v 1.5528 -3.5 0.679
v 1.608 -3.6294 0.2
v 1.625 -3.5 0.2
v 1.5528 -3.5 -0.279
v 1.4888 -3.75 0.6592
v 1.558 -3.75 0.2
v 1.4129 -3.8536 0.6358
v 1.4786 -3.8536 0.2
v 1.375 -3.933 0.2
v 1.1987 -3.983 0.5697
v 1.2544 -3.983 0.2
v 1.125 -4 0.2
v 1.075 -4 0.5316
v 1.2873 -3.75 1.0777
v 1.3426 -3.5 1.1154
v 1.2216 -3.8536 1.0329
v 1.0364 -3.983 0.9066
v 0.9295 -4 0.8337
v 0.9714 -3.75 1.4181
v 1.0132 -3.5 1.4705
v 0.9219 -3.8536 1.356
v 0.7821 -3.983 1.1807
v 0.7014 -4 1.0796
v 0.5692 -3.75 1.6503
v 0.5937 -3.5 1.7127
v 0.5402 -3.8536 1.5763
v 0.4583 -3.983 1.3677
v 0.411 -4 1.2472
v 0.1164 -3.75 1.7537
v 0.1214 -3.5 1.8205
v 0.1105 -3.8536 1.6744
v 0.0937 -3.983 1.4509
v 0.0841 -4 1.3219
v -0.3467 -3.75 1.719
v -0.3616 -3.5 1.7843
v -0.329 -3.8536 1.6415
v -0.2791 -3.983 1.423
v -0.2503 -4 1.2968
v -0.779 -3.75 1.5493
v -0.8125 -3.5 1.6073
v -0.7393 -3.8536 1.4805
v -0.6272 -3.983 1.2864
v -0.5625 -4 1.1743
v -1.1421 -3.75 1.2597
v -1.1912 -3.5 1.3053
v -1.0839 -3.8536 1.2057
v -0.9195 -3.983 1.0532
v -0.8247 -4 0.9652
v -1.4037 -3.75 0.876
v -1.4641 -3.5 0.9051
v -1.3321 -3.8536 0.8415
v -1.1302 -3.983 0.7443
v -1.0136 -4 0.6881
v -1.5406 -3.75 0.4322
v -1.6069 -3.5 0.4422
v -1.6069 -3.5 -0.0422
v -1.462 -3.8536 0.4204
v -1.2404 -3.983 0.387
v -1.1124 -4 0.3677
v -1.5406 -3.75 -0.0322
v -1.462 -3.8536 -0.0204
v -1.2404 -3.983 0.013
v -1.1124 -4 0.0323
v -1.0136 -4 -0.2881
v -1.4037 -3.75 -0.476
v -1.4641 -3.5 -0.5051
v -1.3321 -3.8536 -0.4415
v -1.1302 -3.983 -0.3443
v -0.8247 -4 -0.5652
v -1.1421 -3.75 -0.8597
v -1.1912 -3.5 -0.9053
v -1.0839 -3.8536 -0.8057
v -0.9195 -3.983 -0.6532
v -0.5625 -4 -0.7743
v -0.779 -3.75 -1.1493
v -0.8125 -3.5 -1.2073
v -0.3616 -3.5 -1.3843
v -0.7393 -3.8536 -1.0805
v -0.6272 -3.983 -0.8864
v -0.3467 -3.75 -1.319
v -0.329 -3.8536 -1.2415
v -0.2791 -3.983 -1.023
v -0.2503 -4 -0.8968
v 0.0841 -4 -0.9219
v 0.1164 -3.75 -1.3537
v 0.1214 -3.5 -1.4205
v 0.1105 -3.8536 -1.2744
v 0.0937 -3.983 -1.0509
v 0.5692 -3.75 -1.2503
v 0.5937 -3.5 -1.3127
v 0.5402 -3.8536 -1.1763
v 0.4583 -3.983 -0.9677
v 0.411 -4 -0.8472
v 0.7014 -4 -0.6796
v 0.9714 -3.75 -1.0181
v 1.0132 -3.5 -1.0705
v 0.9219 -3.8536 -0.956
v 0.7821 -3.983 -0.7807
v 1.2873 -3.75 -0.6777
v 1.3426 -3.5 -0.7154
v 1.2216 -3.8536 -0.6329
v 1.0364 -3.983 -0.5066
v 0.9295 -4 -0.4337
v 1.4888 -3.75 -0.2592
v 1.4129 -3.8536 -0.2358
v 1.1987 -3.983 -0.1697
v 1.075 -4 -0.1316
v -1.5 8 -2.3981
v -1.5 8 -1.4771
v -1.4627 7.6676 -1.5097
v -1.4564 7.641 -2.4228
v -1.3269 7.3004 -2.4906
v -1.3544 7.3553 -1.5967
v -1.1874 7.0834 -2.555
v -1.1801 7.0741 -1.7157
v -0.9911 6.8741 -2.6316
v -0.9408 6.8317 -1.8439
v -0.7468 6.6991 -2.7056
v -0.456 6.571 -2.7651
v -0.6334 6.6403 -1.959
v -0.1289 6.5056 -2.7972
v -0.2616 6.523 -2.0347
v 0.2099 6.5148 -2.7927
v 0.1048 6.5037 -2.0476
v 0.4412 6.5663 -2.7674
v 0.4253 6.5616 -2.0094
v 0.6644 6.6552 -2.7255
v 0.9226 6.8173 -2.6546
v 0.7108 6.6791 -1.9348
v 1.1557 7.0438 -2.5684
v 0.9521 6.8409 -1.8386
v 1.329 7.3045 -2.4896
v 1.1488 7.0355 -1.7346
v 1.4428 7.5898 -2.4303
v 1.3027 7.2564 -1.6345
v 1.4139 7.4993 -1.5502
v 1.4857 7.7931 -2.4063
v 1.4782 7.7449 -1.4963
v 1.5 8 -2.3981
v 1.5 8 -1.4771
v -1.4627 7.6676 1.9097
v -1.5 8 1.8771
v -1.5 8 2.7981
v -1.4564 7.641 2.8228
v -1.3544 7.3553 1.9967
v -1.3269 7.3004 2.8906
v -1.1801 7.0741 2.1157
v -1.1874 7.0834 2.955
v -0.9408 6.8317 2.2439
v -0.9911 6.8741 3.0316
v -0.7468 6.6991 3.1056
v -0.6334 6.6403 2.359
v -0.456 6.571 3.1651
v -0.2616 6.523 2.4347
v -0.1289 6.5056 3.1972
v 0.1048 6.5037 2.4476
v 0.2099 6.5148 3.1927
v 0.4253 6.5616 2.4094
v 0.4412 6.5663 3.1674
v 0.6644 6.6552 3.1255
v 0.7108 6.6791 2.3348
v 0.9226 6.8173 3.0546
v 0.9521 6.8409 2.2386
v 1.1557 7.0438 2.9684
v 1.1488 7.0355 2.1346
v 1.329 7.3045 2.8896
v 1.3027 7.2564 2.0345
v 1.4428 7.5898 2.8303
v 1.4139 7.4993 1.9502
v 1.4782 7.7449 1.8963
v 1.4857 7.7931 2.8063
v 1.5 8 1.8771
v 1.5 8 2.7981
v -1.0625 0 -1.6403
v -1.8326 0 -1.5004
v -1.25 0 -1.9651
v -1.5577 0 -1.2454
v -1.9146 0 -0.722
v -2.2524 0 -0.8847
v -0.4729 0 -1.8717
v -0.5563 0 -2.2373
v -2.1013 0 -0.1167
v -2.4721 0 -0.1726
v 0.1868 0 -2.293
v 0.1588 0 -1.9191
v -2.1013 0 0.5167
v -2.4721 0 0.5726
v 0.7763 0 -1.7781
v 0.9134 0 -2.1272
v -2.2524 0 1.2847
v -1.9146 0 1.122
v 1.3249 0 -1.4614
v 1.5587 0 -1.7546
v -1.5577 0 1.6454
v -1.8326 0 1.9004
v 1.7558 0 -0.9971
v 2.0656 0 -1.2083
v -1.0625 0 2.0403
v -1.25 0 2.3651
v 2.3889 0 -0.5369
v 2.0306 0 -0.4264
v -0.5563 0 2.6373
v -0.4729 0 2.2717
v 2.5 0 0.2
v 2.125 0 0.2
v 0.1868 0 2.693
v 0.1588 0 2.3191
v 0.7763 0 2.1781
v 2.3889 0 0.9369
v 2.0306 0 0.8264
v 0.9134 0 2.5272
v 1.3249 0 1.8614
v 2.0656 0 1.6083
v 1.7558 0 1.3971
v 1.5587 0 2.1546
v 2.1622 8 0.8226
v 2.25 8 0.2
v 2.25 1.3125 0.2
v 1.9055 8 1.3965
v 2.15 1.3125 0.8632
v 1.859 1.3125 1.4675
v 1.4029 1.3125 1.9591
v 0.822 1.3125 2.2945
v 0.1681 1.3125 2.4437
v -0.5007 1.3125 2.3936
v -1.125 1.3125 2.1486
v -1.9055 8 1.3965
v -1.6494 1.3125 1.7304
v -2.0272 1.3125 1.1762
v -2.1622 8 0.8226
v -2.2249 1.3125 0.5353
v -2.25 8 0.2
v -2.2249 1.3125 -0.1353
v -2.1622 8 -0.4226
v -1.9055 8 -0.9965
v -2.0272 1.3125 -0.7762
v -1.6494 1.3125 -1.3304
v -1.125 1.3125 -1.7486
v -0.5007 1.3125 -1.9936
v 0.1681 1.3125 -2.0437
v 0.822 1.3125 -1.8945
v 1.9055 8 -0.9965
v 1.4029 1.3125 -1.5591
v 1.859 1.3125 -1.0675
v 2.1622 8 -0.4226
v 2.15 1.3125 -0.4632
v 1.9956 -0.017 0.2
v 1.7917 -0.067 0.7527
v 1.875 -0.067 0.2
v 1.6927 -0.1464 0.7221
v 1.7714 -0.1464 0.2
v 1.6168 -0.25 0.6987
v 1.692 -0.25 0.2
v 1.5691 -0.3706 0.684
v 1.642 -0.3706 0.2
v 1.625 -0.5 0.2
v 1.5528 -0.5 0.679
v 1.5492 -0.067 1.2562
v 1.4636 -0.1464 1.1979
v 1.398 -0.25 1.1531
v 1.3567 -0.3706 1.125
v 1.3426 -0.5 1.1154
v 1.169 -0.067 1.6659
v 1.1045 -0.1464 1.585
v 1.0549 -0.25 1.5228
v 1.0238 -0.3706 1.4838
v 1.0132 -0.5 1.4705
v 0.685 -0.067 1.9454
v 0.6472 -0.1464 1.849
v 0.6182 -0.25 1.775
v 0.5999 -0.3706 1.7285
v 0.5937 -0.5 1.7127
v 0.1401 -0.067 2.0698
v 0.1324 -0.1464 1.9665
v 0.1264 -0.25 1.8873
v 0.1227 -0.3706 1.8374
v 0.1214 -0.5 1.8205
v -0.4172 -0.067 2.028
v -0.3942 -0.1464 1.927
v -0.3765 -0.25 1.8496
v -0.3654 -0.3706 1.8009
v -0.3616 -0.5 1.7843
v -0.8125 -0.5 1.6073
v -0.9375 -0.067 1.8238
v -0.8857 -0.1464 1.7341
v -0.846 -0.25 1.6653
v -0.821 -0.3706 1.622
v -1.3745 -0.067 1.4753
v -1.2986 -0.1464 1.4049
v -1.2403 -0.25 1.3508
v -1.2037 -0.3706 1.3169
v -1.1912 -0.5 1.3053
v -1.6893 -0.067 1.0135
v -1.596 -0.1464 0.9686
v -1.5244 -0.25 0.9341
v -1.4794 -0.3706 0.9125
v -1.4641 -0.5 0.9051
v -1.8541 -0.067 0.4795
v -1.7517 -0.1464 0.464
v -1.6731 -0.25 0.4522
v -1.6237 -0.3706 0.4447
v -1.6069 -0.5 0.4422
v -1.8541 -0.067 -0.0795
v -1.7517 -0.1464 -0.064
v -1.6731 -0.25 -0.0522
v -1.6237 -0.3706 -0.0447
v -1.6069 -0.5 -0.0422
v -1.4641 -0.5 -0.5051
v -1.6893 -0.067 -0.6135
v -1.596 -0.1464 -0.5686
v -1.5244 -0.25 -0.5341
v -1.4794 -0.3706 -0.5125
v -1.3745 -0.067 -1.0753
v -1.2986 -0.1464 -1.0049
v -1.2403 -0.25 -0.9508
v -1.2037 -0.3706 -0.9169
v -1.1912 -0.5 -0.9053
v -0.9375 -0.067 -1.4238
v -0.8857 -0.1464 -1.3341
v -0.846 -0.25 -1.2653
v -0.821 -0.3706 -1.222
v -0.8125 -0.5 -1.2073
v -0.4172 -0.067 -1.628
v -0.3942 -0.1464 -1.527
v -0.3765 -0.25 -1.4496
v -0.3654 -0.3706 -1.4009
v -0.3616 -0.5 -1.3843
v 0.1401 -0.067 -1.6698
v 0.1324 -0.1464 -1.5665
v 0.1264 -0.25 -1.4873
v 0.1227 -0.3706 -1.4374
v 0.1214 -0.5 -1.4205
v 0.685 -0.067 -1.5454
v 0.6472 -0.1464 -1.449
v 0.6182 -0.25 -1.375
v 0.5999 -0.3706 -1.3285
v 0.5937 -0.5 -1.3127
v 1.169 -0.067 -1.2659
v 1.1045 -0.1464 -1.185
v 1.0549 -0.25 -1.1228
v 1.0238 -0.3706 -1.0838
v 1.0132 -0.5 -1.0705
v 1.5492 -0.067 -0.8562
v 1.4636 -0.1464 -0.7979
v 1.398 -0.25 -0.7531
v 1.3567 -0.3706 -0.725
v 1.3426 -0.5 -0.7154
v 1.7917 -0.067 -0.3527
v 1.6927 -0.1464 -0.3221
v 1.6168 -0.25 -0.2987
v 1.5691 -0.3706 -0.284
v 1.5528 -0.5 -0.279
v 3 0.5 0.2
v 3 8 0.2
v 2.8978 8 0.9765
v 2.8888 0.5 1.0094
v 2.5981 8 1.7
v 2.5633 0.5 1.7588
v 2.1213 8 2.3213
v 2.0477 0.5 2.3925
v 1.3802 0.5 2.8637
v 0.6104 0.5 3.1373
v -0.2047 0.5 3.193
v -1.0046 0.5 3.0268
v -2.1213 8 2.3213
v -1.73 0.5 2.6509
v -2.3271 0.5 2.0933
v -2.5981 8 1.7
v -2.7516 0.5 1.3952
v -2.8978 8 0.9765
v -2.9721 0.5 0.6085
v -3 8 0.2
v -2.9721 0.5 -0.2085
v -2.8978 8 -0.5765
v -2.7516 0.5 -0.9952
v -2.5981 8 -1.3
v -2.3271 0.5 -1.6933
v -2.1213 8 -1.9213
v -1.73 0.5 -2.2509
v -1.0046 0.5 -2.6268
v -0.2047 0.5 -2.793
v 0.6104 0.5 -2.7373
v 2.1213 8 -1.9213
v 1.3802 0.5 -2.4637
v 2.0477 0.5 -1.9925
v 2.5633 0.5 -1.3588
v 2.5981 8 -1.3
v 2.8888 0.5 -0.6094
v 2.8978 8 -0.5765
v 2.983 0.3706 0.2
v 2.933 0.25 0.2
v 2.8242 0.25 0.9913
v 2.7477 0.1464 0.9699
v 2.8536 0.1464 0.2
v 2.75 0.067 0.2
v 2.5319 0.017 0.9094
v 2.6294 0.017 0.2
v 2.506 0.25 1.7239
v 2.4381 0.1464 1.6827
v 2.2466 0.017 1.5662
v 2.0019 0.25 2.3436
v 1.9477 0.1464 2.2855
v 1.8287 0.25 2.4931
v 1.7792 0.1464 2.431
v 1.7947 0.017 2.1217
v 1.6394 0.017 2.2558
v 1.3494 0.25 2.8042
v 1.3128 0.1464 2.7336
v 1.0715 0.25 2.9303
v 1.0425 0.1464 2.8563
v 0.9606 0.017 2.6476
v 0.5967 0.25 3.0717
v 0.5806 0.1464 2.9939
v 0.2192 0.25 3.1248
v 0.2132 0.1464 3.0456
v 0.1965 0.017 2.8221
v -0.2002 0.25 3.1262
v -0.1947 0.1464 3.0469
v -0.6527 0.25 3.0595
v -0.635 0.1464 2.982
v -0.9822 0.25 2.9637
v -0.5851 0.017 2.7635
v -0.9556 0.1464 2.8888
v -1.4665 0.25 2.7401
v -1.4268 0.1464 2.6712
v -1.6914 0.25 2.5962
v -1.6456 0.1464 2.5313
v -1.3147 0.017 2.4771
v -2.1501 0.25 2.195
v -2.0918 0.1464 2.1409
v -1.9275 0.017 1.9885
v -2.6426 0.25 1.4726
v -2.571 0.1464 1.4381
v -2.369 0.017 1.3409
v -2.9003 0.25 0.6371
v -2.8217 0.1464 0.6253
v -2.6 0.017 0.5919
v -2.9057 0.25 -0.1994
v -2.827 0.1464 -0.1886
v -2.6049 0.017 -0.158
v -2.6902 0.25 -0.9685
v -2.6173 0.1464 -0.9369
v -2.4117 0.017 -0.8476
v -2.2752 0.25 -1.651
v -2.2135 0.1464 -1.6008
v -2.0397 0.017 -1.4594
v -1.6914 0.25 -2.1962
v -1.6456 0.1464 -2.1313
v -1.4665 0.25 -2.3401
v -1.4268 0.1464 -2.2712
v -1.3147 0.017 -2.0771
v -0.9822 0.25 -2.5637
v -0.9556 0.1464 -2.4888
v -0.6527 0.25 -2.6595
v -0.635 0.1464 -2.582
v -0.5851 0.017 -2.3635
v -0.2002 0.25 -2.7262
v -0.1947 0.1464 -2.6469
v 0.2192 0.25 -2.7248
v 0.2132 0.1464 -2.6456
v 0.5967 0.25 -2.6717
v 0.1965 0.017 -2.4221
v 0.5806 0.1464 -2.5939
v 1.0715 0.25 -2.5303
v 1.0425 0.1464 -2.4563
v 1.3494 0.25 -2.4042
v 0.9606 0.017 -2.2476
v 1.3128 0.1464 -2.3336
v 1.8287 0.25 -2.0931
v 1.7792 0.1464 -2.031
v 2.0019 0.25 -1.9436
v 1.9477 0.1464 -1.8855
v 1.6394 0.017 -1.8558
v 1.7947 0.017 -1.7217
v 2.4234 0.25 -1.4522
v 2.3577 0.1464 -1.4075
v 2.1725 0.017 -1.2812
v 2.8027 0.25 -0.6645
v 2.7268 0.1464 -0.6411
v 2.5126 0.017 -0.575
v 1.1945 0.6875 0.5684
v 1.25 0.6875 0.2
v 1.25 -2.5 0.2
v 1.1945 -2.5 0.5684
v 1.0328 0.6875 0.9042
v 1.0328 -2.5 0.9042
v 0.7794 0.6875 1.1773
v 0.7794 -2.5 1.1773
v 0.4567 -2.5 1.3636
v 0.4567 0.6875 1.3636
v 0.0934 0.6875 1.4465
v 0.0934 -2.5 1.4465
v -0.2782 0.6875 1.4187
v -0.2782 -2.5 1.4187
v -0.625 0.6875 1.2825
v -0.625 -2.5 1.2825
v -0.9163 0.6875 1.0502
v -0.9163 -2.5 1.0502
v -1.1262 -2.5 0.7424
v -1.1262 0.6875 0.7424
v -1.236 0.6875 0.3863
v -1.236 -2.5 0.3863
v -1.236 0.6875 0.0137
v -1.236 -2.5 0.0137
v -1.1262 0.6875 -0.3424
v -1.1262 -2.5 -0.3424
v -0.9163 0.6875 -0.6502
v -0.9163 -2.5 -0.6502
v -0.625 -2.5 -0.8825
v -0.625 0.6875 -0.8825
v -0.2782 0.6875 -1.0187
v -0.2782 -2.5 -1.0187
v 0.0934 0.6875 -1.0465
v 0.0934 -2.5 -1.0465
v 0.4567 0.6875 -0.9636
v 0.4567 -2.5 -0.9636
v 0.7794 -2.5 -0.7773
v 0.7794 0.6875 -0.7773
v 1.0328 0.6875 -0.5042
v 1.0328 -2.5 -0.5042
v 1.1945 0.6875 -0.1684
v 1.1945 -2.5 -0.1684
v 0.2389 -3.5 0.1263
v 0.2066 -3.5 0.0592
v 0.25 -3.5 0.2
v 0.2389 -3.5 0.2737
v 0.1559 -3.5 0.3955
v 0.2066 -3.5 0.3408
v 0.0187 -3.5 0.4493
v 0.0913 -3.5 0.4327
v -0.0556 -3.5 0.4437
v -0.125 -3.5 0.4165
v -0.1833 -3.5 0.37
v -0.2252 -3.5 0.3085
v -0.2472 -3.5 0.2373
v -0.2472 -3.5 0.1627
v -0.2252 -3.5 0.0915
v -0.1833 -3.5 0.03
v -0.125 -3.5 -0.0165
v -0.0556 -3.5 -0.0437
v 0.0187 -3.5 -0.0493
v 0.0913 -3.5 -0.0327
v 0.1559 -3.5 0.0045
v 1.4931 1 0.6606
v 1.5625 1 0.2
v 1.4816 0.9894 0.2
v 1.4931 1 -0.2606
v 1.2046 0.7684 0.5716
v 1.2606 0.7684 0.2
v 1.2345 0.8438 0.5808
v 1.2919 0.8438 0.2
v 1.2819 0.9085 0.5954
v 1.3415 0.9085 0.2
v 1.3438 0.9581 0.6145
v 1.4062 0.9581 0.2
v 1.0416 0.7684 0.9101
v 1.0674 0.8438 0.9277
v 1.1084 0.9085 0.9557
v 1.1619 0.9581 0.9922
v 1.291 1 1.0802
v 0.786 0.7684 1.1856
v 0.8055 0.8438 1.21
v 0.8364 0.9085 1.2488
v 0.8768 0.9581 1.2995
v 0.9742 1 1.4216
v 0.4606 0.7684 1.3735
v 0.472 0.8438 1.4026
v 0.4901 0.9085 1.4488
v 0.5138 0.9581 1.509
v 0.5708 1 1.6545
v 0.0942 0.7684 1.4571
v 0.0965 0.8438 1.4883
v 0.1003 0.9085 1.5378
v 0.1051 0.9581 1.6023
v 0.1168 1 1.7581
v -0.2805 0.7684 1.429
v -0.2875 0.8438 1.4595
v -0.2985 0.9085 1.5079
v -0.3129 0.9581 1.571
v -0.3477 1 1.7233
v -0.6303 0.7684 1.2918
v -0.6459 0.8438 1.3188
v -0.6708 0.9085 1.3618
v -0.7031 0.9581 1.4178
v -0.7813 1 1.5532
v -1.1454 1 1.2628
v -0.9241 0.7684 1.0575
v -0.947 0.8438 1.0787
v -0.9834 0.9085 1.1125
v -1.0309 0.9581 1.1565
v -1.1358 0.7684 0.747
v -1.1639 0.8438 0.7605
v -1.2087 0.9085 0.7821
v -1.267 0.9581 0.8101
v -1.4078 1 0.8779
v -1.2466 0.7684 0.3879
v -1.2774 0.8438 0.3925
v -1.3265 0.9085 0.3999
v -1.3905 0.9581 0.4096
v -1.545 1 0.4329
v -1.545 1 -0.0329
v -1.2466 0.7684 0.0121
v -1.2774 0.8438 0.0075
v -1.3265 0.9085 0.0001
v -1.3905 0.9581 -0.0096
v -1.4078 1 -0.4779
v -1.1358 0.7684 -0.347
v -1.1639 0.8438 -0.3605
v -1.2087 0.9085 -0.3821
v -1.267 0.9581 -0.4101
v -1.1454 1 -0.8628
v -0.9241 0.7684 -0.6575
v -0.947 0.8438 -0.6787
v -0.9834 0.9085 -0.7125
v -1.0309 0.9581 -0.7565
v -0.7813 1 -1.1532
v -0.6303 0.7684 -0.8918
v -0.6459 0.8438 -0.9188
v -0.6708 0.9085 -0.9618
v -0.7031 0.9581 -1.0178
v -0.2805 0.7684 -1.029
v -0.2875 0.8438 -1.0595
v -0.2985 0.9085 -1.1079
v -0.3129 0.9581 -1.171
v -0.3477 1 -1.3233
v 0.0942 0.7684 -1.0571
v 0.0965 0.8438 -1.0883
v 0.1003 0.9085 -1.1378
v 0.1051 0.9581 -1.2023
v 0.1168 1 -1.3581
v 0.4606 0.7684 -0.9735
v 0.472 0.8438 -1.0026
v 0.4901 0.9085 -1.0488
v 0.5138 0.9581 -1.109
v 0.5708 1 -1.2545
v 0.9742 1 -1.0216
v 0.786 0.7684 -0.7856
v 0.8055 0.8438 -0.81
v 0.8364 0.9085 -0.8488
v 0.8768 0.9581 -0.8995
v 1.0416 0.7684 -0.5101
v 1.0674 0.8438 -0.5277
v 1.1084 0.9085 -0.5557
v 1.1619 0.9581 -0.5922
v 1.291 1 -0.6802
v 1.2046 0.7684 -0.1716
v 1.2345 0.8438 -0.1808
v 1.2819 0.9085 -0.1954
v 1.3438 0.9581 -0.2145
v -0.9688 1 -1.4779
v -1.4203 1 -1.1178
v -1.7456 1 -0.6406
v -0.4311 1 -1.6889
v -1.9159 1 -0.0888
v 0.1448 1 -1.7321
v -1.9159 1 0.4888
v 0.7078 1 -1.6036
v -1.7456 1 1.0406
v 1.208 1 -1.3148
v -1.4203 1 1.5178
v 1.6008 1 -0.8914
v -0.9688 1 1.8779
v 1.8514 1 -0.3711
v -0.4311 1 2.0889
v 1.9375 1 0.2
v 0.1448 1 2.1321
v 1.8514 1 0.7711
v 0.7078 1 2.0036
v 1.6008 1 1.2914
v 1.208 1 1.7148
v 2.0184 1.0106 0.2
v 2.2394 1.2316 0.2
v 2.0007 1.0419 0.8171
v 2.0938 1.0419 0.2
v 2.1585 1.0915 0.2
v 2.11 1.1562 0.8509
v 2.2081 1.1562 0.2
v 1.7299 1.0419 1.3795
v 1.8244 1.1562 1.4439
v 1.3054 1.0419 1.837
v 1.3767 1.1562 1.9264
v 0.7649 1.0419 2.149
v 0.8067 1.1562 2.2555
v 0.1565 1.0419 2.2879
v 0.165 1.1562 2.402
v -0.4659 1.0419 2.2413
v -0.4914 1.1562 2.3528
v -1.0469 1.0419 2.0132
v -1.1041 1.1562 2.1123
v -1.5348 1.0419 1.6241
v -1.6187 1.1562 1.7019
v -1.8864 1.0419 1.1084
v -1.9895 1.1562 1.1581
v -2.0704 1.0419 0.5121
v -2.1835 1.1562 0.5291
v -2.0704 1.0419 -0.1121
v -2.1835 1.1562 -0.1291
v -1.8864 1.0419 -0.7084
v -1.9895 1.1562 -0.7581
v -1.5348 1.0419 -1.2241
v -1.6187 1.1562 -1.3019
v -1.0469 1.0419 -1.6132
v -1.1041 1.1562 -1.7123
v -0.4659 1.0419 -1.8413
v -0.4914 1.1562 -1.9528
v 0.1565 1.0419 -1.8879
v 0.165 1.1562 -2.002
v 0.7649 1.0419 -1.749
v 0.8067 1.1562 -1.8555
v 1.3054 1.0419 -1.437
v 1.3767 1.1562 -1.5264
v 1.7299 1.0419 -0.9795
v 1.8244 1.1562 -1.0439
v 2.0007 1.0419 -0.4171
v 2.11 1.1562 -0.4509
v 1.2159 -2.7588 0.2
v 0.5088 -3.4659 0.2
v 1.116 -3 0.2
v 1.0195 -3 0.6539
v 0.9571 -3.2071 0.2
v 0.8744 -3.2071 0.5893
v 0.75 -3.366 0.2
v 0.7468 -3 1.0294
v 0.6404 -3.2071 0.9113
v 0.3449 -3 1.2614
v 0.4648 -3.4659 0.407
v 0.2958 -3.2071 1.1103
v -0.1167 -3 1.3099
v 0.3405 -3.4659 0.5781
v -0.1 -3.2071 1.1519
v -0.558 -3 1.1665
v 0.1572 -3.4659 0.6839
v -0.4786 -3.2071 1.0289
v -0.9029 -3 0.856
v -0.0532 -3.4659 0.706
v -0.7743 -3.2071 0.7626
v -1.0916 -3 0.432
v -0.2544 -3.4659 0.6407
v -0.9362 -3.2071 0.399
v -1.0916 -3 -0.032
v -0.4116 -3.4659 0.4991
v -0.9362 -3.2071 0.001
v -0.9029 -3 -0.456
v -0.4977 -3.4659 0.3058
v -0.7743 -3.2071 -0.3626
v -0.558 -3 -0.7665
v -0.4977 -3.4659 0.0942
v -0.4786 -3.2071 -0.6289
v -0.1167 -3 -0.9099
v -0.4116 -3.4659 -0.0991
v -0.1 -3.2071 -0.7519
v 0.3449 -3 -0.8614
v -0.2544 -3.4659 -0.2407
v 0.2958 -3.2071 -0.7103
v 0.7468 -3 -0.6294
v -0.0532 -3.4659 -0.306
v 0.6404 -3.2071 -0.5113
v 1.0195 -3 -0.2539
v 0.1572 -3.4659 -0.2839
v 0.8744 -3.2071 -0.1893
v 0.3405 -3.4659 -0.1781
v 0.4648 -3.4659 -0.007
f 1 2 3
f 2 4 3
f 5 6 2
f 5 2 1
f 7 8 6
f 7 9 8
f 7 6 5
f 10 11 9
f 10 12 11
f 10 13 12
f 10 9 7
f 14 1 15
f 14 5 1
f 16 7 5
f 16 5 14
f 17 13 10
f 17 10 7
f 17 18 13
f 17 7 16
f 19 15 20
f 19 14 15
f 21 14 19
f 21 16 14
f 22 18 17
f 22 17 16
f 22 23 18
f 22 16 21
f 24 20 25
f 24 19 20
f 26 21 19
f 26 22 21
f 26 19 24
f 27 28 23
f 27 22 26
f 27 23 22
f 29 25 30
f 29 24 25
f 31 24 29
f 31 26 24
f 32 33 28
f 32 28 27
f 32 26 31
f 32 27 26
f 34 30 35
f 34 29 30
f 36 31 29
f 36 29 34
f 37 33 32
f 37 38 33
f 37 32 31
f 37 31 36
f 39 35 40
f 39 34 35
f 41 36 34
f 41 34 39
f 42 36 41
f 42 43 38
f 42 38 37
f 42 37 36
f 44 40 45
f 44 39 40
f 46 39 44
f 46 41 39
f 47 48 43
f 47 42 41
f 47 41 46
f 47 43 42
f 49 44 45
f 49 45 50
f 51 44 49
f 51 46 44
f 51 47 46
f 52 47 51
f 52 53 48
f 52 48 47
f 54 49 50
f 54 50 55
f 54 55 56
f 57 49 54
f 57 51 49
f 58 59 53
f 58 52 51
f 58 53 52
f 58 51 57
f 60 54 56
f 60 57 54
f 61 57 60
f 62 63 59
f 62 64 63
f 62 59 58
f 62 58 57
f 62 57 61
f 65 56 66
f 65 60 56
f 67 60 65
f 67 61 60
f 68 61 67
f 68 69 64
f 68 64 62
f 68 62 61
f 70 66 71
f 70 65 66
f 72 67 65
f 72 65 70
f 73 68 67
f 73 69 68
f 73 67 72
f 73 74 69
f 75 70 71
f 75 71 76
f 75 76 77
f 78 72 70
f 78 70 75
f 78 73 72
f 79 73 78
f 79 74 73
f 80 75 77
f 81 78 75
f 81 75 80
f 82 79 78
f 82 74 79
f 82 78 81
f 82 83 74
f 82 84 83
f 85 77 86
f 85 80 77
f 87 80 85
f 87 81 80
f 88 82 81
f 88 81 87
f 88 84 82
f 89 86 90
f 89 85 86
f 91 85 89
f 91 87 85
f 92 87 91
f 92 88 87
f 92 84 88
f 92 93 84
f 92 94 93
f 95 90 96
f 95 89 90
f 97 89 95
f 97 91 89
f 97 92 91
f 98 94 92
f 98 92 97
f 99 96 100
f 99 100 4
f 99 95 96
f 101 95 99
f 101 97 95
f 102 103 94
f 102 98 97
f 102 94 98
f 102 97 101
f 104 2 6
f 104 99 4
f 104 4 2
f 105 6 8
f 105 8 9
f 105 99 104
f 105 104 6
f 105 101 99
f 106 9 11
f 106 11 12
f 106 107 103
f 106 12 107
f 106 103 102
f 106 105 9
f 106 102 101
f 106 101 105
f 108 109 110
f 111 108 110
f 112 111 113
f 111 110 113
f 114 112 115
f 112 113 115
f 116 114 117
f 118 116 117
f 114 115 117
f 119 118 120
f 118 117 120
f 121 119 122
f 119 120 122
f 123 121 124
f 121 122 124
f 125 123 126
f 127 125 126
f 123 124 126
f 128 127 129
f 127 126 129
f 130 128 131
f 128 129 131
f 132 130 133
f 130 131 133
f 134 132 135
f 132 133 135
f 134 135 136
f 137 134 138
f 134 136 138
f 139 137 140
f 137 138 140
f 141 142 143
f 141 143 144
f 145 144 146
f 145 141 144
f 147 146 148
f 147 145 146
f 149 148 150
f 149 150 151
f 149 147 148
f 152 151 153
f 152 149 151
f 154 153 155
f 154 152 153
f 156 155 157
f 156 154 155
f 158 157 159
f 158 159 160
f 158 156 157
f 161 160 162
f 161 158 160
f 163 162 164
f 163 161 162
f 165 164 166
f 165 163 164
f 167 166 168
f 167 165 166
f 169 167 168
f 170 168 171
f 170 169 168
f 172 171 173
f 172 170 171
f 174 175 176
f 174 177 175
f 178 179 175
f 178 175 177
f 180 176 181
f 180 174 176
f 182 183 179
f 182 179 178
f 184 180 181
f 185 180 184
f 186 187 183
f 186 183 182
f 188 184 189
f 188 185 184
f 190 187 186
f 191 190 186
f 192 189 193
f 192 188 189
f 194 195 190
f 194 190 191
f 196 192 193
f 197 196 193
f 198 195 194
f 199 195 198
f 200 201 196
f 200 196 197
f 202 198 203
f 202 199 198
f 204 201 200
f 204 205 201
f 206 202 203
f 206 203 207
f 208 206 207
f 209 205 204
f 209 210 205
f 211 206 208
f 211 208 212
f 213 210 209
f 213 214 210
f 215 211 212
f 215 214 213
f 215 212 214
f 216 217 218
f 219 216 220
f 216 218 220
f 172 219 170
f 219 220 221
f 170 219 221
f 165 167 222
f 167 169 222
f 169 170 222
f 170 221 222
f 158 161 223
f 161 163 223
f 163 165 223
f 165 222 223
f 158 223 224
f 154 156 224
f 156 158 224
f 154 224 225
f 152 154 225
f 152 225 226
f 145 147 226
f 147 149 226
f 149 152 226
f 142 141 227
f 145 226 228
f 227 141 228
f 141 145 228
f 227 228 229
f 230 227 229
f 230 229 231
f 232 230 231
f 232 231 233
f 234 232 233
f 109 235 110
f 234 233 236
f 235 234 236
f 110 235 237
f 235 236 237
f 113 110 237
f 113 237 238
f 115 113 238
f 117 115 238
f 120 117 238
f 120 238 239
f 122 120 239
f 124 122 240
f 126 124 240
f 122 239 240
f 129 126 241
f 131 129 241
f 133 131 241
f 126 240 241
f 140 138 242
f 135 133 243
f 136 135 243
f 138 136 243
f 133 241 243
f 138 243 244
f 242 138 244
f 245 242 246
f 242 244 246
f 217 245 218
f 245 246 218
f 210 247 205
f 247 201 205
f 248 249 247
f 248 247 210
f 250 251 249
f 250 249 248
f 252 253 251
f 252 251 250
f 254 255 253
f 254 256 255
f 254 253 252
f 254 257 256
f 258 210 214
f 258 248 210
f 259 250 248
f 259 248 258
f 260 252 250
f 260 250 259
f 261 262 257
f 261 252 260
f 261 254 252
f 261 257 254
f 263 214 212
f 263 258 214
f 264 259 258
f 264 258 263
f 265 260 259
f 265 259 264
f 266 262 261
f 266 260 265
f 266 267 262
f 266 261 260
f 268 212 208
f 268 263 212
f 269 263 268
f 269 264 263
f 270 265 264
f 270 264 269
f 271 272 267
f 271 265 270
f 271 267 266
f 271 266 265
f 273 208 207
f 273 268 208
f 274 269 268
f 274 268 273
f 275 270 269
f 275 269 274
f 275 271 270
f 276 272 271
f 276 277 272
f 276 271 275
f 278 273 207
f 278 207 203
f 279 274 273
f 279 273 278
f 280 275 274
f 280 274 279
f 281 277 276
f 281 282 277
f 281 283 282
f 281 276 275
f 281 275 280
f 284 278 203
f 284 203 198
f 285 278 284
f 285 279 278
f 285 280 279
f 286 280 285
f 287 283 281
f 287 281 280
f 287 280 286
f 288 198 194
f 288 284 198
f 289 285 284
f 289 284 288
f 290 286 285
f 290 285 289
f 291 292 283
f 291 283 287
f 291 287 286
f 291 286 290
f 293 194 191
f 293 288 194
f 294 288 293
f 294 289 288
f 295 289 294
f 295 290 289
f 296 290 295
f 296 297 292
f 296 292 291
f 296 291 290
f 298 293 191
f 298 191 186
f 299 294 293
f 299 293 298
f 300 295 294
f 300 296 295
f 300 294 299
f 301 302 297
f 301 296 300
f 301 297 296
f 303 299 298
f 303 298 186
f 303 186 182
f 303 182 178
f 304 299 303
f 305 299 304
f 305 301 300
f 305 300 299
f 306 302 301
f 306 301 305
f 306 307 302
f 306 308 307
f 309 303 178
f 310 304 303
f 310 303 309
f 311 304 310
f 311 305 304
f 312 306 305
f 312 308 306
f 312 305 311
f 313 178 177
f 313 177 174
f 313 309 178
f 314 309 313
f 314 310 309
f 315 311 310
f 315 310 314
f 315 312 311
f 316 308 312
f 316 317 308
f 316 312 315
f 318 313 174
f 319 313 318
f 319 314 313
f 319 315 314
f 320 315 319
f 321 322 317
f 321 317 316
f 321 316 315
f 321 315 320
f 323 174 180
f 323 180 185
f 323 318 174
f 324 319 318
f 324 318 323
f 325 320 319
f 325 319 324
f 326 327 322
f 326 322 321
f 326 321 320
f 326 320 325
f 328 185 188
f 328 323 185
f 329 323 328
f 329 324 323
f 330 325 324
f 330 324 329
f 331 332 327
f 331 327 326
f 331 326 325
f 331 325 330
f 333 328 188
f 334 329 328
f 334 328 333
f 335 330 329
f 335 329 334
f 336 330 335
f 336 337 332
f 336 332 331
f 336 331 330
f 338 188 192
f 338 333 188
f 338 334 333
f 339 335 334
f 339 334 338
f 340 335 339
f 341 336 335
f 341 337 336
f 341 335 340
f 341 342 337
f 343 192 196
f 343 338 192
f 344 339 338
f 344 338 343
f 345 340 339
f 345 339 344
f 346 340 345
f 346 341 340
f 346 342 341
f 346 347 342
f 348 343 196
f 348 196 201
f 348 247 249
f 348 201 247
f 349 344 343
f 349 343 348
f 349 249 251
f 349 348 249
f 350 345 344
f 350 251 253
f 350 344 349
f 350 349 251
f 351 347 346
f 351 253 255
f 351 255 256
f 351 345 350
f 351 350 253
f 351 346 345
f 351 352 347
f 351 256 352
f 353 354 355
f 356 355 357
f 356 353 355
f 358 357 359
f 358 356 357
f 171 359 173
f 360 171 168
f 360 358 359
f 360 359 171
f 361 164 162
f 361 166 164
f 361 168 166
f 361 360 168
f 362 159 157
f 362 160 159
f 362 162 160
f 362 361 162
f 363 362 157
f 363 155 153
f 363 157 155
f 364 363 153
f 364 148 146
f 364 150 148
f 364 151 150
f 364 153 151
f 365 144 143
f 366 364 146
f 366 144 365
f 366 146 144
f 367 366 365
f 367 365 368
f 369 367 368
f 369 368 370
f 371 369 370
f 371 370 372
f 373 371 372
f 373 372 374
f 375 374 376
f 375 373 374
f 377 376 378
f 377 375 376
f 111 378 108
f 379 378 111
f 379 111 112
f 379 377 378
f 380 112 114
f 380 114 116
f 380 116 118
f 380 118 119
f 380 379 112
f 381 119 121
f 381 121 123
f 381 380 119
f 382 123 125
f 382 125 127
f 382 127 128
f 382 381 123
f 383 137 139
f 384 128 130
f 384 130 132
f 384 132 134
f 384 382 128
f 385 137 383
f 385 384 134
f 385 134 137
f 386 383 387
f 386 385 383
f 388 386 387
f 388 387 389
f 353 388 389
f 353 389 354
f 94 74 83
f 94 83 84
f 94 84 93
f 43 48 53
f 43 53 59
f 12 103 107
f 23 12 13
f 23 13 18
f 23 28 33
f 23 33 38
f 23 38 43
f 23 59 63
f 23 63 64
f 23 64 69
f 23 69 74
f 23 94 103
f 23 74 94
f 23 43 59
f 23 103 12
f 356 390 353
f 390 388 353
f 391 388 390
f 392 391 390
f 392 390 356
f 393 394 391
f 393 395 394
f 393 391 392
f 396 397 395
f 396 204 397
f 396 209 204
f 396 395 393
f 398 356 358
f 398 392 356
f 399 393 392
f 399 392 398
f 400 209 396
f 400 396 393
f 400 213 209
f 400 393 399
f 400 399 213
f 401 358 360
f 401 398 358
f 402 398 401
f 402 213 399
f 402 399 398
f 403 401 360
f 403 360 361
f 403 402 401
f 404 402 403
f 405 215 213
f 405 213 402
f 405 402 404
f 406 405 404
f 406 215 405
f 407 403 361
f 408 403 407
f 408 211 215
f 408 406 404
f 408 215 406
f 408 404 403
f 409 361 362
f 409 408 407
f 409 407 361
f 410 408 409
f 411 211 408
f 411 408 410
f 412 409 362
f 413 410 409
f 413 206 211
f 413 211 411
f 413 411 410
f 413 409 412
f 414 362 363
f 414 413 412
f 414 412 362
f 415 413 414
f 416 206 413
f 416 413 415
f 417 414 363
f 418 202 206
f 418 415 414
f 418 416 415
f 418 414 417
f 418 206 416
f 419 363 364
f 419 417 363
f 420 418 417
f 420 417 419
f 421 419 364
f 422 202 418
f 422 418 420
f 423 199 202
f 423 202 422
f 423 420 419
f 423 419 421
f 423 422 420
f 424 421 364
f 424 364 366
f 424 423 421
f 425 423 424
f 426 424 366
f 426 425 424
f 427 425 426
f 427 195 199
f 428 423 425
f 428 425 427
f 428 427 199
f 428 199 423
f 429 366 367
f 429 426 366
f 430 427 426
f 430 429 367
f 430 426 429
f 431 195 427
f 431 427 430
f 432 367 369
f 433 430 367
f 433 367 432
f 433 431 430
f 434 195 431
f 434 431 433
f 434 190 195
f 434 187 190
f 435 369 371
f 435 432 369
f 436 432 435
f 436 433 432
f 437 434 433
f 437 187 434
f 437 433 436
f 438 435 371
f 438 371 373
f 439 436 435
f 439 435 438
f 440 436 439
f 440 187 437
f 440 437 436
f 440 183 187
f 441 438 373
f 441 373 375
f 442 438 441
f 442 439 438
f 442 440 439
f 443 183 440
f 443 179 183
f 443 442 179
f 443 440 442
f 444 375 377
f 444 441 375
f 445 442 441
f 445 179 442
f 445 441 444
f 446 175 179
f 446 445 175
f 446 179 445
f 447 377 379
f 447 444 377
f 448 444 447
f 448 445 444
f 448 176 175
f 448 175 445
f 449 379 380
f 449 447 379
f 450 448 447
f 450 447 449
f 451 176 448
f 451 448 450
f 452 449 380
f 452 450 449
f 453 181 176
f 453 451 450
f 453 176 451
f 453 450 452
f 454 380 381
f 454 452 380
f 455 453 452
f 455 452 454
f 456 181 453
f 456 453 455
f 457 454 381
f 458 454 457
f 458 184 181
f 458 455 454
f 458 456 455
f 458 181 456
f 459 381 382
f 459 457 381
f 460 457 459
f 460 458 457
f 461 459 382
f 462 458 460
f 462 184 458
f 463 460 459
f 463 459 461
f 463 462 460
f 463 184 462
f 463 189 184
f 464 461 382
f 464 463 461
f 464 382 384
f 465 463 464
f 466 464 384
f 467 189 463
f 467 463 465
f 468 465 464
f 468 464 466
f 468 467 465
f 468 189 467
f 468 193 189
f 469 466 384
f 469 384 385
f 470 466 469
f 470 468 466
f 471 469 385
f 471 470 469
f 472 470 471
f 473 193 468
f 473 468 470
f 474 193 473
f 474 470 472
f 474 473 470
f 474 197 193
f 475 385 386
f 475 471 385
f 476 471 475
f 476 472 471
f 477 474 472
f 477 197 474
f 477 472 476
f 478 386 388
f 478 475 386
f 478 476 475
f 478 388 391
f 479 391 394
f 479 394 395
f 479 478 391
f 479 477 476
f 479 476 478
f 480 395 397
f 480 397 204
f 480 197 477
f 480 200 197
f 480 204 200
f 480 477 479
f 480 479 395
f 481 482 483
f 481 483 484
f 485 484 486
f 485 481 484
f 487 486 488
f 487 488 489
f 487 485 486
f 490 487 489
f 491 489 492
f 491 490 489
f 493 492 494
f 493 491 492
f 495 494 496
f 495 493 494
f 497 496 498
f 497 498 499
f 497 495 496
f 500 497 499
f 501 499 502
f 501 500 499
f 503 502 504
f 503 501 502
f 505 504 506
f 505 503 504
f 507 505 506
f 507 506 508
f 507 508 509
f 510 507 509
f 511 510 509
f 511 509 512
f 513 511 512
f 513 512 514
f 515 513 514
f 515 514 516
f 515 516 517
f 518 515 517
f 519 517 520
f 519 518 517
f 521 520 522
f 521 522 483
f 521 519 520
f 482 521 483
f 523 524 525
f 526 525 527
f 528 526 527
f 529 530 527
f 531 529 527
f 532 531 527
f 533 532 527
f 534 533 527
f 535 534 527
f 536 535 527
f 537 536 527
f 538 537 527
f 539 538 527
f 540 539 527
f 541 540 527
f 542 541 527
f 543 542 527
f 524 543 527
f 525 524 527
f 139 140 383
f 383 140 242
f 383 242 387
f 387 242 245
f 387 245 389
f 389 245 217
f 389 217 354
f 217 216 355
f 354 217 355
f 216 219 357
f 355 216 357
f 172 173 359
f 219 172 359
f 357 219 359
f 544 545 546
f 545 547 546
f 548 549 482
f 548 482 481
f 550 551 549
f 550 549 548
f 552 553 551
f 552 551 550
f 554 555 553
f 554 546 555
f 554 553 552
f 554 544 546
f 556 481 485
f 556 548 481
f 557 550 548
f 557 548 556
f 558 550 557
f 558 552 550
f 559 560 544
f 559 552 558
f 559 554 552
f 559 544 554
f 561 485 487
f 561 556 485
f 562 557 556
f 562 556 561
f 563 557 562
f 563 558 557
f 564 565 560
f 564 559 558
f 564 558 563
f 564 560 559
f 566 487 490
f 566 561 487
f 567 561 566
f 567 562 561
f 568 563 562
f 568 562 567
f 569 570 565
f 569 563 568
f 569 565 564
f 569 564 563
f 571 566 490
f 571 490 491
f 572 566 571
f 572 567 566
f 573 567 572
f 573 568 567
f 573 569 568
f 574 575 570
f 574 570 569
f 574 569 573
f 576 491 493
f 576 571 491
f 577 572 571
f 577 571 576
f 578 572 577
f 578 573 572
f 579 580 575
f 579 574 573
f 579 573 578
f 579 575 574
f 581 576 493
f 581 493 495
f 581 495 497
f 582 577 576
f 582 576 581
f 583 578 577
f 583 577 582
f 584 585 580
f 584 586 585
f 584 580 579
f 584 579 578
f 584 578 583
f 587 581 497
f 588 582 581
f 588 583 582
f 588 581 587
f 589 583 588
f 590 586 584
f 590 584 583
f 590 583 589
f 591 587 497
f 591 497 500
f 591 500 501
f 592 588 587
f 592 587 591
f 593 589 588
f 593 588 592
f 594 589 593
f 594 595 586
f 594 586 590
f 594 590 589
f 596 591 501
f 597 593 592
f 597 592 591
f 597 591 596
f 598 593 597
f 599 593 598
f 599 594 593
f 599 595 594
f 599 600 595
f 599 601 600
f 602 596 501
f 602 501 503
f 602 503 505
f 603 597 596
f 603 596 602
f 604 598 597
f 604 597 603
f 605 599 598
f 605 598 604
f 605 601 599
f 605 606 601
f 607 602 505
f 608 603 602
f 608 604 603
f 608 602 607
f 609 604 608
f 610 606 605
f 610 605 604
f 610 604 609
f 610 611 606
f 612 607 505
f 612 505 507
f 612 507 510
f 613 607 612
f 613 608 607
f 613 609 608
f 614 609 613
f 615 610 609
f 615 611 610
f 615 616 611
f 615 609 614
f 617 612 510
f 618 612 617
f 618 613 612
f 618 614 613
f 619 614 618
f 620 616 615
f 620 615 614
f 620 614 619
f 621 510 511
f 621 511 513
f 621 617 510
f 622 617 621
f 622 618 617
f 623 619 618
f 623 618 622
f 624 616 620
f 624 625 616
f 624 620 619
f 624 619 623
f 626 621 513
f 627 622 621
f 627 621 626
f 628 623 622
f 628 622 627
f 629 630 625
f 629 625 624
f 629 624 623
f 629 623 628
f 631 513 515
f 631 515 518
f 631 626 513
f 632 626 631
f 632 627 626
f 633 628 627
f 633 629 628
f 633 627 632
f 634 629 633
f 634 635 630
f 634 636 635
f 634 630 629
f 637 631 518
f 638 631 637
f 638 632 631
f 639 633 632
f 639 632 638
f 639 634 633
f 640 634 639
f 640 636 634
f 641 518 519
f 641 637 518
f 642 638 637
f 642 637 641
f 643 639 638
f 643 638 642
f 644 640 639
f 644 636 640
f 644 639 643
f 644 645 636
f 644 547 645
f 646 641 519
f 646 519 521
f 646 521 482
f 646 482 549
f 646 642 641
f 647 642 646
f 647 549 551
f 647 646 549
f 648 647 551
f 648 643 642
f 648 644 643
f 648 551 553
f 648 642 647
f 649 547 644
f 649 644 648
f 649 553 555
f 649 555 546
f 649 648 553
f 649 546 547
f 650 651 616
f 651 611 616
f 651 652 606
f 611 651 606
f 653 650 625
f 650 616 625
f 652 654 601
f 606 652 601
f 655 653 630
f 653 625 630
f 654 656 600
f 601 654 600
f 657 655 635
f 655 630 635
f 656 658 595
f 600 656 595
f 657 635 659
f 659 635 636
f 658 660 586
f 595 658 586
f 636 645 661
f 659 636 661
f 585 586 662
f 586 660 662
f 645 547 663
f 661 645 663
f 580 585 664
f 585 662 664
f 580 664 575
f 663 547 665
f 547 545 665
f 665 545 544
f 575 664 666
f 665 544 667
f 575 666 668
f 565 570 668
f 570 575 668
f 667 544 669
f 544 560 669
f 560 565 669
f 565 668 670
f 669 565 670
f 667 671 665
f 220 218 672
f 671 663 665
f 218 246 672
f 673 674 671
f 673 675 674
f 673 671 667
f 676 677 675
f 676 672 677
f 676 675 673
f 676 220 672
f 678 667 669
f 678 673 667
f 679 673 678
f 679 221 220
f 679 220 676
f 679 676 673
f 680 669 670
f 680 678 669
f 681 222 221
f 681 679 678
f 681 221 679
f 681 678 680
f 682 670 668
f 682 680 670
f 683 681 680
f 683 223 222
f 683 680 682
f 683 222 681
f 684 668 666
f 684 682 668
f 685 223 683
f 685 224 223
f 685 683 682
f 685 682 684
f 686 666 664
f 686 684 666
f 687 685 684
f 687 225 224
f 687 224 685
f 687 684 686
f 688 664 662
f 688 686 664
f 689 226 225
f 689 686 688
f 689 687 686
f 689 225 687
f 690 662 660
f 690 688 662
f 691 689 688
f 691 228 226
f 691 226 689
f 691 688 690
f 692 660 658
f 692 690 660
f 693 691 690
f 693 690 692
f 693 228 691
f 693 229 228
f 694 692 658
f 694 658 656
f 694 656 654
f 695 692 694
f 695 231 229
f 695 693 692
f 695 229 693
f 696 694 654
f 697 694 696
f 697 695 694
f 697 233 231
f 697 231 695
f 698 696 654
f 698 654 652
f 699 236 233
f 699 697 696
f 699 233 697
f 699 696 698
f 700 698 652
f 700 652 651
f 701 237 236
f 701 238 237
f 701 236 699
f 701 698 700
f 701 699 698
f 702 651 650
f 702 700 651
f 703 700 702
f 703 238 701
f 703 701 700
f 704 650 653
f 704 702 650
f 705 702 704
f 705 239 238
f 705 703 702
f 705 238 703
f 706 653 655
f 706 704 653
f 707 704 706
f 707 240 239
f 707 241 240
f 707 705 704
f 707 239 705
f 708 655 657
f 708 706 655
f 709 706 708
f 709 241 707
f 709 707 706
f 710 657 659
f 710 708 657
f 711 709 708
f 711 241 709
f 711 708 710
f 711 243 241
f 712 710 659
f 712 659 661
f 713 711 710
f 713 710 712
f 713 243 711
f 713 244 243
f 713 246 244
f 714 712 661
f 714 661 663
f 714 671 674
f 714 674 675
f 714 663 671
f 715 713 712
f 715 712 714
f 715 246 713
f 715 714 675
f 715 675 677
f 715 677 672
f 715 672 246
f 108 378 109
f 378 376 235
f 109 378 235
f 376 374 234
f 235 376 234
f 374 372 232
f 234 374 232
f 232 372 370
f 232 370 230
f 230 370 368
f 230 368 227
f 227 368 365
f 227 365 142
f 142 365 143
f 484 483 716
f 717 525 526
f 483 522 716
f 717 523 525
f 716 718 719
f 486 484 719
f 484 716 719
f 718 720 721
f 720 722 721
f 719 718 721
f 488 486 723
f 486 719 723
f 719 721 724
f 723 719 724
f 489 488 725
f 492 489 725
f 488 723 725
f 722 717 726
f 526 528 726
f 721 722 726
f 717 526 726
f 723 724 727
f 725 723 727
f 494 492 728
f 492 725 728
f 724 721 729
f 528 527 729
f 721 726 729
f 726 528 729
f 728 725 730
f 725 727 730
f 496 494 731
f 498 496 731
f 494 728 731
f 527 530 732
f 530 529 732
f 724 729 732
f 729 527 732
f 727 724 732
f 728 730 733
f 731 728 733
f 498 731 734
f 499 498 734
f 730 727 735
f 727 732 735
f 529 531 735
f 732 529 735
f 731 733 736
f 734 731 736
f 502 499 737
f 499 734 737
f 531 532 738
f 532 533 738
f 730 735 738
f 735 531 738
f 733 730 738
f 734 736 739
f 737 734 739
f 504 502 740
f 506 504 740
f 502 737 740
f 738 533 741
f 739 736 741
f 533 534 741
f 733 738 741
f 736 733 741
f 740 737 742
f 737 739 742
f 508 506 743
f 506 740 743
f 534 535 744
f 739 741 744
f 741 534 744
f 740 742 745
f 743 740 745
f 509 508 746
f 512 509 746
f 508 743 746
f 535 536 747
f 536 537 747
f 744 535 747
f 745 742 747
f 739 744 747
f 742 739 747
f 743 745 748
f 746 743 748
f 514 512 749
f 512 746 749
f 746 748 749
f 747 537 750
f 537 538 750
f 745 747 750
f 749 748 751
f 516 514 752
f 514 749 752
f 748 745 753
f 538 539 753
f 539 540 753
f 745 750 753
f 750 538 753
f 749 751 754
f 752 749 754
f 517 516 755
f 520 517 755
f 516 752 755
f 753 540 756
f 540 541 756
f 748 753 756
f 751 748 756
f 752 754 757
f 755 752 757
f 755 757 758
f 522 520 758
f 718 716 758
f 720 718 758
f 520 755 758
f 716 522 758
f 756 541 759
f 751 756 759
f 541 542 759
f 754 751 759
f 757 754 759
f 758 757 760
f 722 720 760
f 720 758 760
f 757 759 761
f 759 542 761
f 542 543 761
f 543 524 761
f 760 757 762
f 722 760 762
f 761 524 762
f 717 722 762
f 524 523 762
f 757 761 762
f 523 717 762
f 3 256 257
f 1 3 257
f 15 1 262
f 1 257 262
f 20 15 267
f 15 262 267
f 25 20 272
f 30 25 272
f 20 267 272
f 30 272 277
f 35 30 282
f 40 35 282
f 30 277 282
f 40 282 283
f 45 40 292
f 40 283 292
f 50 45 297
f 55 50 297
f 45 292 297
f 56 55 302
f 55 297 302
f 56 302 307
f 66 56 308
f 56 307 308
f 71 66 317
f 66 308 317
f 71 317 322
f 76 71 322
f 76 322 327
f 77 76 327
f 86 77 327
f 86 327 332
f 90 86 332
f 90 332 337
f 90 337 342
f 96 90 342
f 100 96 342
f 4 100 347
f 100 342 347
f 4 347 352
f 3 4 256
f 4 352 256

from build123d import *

# Parameters (mm, degrees)
SKETCH010_R          = 3
PAD002_DEPTH         = 8
SKETCH011_R          = 1.625
PAD003_DEPTH         = 4
SKETCH012_R          = 2.25
POCKET_DEPTH         = 7.001
SKETCH013_R          = 1.25
POCKET001_DEPTH      = 4.5
FILLET_R             = 0.5
FILLET001_R          = 1
FILLET002_R          = 0.3125
SKETCH014_R          = 1.5
POCKET002_DEPTH      = 2.801
POCKET002_DEPTH_BACK = 3.201


with BuildPart() as part:
    # Sketch010 → Pad002 (new body)
    with BuildSketch(Plane.XZ):
        with Locations((0, 0.2)):
            Circle(SKETCH010_R)
    extrude(amount=-PAD002_DEPTH)

    # Sketch011 → Pad003 (join)
    with BuildSketch(Plane.XZ):
        with Locations((0, 0.2)):
            Circle(SKETCH011_R)
    extrude(amount=PAD003_DEPTH)

    # Sketch012 → Pocket (cut, through all)
    with BuildSketch(Plane.XZ.offset(-1)):
        with Locations((0, 0.2)):
            Circle(SKETCH012_R)
    extrude(amount=-POCKET_DEPTH, mode=Mode.SUBTRACT)

    # Sketch013 → Pocket001 (cut)
    with BuildSketch(Plane.XZ.offset(-1)):
        with Locations((0, 0.2)):
            Circle(SKETCH013_R)
    extrude(amount=POCKET001_DEPTH, mode=Mode.SUBTRACT)

    # Fillet
    fillet_edges = [part.edges().sort_by_distance(p)[0] for p in [
        (-1.625, -4, 0.2),
        (-1.625, 0, 0.2),
        (-3, 0, 0.2),
    ]]
    fillet(fillet_edges, radius=FILLET_R)

    # Fillet001
    fillet001_edges = [part.edges().sort_by_distance(p)[0] for p in [
        (-1.25, -3.5, 0.2),
    ]]
    fillet(fillet001_edges, radius=FILLET001_R)

    # Fillet002
    fillet002_edges = [part.edges().sort_by_distance(p)[0] for p in [
        (-1.25, 1, 0.2),
        (-2.25, 1, 0.2),
    ]]
    fillet(fillet002_edges, radius=FILLET002_R)

    # Sketch014 → Pocket002 (cut, two sides)
    with BuildSketch(Plane.XY) as pocket002_sk:
        with Locations((0, 8)):
            Circle(SKETCH014_R)
    extrude(amount=-POCKET002_DEPTH, mode=Mode.SUBTRACT)
    extrude(pocket002_sk.sketch, amount=POCKET002_DEPTH_BACK, mode=Mode.SUBTRACT)


solid = part.part
